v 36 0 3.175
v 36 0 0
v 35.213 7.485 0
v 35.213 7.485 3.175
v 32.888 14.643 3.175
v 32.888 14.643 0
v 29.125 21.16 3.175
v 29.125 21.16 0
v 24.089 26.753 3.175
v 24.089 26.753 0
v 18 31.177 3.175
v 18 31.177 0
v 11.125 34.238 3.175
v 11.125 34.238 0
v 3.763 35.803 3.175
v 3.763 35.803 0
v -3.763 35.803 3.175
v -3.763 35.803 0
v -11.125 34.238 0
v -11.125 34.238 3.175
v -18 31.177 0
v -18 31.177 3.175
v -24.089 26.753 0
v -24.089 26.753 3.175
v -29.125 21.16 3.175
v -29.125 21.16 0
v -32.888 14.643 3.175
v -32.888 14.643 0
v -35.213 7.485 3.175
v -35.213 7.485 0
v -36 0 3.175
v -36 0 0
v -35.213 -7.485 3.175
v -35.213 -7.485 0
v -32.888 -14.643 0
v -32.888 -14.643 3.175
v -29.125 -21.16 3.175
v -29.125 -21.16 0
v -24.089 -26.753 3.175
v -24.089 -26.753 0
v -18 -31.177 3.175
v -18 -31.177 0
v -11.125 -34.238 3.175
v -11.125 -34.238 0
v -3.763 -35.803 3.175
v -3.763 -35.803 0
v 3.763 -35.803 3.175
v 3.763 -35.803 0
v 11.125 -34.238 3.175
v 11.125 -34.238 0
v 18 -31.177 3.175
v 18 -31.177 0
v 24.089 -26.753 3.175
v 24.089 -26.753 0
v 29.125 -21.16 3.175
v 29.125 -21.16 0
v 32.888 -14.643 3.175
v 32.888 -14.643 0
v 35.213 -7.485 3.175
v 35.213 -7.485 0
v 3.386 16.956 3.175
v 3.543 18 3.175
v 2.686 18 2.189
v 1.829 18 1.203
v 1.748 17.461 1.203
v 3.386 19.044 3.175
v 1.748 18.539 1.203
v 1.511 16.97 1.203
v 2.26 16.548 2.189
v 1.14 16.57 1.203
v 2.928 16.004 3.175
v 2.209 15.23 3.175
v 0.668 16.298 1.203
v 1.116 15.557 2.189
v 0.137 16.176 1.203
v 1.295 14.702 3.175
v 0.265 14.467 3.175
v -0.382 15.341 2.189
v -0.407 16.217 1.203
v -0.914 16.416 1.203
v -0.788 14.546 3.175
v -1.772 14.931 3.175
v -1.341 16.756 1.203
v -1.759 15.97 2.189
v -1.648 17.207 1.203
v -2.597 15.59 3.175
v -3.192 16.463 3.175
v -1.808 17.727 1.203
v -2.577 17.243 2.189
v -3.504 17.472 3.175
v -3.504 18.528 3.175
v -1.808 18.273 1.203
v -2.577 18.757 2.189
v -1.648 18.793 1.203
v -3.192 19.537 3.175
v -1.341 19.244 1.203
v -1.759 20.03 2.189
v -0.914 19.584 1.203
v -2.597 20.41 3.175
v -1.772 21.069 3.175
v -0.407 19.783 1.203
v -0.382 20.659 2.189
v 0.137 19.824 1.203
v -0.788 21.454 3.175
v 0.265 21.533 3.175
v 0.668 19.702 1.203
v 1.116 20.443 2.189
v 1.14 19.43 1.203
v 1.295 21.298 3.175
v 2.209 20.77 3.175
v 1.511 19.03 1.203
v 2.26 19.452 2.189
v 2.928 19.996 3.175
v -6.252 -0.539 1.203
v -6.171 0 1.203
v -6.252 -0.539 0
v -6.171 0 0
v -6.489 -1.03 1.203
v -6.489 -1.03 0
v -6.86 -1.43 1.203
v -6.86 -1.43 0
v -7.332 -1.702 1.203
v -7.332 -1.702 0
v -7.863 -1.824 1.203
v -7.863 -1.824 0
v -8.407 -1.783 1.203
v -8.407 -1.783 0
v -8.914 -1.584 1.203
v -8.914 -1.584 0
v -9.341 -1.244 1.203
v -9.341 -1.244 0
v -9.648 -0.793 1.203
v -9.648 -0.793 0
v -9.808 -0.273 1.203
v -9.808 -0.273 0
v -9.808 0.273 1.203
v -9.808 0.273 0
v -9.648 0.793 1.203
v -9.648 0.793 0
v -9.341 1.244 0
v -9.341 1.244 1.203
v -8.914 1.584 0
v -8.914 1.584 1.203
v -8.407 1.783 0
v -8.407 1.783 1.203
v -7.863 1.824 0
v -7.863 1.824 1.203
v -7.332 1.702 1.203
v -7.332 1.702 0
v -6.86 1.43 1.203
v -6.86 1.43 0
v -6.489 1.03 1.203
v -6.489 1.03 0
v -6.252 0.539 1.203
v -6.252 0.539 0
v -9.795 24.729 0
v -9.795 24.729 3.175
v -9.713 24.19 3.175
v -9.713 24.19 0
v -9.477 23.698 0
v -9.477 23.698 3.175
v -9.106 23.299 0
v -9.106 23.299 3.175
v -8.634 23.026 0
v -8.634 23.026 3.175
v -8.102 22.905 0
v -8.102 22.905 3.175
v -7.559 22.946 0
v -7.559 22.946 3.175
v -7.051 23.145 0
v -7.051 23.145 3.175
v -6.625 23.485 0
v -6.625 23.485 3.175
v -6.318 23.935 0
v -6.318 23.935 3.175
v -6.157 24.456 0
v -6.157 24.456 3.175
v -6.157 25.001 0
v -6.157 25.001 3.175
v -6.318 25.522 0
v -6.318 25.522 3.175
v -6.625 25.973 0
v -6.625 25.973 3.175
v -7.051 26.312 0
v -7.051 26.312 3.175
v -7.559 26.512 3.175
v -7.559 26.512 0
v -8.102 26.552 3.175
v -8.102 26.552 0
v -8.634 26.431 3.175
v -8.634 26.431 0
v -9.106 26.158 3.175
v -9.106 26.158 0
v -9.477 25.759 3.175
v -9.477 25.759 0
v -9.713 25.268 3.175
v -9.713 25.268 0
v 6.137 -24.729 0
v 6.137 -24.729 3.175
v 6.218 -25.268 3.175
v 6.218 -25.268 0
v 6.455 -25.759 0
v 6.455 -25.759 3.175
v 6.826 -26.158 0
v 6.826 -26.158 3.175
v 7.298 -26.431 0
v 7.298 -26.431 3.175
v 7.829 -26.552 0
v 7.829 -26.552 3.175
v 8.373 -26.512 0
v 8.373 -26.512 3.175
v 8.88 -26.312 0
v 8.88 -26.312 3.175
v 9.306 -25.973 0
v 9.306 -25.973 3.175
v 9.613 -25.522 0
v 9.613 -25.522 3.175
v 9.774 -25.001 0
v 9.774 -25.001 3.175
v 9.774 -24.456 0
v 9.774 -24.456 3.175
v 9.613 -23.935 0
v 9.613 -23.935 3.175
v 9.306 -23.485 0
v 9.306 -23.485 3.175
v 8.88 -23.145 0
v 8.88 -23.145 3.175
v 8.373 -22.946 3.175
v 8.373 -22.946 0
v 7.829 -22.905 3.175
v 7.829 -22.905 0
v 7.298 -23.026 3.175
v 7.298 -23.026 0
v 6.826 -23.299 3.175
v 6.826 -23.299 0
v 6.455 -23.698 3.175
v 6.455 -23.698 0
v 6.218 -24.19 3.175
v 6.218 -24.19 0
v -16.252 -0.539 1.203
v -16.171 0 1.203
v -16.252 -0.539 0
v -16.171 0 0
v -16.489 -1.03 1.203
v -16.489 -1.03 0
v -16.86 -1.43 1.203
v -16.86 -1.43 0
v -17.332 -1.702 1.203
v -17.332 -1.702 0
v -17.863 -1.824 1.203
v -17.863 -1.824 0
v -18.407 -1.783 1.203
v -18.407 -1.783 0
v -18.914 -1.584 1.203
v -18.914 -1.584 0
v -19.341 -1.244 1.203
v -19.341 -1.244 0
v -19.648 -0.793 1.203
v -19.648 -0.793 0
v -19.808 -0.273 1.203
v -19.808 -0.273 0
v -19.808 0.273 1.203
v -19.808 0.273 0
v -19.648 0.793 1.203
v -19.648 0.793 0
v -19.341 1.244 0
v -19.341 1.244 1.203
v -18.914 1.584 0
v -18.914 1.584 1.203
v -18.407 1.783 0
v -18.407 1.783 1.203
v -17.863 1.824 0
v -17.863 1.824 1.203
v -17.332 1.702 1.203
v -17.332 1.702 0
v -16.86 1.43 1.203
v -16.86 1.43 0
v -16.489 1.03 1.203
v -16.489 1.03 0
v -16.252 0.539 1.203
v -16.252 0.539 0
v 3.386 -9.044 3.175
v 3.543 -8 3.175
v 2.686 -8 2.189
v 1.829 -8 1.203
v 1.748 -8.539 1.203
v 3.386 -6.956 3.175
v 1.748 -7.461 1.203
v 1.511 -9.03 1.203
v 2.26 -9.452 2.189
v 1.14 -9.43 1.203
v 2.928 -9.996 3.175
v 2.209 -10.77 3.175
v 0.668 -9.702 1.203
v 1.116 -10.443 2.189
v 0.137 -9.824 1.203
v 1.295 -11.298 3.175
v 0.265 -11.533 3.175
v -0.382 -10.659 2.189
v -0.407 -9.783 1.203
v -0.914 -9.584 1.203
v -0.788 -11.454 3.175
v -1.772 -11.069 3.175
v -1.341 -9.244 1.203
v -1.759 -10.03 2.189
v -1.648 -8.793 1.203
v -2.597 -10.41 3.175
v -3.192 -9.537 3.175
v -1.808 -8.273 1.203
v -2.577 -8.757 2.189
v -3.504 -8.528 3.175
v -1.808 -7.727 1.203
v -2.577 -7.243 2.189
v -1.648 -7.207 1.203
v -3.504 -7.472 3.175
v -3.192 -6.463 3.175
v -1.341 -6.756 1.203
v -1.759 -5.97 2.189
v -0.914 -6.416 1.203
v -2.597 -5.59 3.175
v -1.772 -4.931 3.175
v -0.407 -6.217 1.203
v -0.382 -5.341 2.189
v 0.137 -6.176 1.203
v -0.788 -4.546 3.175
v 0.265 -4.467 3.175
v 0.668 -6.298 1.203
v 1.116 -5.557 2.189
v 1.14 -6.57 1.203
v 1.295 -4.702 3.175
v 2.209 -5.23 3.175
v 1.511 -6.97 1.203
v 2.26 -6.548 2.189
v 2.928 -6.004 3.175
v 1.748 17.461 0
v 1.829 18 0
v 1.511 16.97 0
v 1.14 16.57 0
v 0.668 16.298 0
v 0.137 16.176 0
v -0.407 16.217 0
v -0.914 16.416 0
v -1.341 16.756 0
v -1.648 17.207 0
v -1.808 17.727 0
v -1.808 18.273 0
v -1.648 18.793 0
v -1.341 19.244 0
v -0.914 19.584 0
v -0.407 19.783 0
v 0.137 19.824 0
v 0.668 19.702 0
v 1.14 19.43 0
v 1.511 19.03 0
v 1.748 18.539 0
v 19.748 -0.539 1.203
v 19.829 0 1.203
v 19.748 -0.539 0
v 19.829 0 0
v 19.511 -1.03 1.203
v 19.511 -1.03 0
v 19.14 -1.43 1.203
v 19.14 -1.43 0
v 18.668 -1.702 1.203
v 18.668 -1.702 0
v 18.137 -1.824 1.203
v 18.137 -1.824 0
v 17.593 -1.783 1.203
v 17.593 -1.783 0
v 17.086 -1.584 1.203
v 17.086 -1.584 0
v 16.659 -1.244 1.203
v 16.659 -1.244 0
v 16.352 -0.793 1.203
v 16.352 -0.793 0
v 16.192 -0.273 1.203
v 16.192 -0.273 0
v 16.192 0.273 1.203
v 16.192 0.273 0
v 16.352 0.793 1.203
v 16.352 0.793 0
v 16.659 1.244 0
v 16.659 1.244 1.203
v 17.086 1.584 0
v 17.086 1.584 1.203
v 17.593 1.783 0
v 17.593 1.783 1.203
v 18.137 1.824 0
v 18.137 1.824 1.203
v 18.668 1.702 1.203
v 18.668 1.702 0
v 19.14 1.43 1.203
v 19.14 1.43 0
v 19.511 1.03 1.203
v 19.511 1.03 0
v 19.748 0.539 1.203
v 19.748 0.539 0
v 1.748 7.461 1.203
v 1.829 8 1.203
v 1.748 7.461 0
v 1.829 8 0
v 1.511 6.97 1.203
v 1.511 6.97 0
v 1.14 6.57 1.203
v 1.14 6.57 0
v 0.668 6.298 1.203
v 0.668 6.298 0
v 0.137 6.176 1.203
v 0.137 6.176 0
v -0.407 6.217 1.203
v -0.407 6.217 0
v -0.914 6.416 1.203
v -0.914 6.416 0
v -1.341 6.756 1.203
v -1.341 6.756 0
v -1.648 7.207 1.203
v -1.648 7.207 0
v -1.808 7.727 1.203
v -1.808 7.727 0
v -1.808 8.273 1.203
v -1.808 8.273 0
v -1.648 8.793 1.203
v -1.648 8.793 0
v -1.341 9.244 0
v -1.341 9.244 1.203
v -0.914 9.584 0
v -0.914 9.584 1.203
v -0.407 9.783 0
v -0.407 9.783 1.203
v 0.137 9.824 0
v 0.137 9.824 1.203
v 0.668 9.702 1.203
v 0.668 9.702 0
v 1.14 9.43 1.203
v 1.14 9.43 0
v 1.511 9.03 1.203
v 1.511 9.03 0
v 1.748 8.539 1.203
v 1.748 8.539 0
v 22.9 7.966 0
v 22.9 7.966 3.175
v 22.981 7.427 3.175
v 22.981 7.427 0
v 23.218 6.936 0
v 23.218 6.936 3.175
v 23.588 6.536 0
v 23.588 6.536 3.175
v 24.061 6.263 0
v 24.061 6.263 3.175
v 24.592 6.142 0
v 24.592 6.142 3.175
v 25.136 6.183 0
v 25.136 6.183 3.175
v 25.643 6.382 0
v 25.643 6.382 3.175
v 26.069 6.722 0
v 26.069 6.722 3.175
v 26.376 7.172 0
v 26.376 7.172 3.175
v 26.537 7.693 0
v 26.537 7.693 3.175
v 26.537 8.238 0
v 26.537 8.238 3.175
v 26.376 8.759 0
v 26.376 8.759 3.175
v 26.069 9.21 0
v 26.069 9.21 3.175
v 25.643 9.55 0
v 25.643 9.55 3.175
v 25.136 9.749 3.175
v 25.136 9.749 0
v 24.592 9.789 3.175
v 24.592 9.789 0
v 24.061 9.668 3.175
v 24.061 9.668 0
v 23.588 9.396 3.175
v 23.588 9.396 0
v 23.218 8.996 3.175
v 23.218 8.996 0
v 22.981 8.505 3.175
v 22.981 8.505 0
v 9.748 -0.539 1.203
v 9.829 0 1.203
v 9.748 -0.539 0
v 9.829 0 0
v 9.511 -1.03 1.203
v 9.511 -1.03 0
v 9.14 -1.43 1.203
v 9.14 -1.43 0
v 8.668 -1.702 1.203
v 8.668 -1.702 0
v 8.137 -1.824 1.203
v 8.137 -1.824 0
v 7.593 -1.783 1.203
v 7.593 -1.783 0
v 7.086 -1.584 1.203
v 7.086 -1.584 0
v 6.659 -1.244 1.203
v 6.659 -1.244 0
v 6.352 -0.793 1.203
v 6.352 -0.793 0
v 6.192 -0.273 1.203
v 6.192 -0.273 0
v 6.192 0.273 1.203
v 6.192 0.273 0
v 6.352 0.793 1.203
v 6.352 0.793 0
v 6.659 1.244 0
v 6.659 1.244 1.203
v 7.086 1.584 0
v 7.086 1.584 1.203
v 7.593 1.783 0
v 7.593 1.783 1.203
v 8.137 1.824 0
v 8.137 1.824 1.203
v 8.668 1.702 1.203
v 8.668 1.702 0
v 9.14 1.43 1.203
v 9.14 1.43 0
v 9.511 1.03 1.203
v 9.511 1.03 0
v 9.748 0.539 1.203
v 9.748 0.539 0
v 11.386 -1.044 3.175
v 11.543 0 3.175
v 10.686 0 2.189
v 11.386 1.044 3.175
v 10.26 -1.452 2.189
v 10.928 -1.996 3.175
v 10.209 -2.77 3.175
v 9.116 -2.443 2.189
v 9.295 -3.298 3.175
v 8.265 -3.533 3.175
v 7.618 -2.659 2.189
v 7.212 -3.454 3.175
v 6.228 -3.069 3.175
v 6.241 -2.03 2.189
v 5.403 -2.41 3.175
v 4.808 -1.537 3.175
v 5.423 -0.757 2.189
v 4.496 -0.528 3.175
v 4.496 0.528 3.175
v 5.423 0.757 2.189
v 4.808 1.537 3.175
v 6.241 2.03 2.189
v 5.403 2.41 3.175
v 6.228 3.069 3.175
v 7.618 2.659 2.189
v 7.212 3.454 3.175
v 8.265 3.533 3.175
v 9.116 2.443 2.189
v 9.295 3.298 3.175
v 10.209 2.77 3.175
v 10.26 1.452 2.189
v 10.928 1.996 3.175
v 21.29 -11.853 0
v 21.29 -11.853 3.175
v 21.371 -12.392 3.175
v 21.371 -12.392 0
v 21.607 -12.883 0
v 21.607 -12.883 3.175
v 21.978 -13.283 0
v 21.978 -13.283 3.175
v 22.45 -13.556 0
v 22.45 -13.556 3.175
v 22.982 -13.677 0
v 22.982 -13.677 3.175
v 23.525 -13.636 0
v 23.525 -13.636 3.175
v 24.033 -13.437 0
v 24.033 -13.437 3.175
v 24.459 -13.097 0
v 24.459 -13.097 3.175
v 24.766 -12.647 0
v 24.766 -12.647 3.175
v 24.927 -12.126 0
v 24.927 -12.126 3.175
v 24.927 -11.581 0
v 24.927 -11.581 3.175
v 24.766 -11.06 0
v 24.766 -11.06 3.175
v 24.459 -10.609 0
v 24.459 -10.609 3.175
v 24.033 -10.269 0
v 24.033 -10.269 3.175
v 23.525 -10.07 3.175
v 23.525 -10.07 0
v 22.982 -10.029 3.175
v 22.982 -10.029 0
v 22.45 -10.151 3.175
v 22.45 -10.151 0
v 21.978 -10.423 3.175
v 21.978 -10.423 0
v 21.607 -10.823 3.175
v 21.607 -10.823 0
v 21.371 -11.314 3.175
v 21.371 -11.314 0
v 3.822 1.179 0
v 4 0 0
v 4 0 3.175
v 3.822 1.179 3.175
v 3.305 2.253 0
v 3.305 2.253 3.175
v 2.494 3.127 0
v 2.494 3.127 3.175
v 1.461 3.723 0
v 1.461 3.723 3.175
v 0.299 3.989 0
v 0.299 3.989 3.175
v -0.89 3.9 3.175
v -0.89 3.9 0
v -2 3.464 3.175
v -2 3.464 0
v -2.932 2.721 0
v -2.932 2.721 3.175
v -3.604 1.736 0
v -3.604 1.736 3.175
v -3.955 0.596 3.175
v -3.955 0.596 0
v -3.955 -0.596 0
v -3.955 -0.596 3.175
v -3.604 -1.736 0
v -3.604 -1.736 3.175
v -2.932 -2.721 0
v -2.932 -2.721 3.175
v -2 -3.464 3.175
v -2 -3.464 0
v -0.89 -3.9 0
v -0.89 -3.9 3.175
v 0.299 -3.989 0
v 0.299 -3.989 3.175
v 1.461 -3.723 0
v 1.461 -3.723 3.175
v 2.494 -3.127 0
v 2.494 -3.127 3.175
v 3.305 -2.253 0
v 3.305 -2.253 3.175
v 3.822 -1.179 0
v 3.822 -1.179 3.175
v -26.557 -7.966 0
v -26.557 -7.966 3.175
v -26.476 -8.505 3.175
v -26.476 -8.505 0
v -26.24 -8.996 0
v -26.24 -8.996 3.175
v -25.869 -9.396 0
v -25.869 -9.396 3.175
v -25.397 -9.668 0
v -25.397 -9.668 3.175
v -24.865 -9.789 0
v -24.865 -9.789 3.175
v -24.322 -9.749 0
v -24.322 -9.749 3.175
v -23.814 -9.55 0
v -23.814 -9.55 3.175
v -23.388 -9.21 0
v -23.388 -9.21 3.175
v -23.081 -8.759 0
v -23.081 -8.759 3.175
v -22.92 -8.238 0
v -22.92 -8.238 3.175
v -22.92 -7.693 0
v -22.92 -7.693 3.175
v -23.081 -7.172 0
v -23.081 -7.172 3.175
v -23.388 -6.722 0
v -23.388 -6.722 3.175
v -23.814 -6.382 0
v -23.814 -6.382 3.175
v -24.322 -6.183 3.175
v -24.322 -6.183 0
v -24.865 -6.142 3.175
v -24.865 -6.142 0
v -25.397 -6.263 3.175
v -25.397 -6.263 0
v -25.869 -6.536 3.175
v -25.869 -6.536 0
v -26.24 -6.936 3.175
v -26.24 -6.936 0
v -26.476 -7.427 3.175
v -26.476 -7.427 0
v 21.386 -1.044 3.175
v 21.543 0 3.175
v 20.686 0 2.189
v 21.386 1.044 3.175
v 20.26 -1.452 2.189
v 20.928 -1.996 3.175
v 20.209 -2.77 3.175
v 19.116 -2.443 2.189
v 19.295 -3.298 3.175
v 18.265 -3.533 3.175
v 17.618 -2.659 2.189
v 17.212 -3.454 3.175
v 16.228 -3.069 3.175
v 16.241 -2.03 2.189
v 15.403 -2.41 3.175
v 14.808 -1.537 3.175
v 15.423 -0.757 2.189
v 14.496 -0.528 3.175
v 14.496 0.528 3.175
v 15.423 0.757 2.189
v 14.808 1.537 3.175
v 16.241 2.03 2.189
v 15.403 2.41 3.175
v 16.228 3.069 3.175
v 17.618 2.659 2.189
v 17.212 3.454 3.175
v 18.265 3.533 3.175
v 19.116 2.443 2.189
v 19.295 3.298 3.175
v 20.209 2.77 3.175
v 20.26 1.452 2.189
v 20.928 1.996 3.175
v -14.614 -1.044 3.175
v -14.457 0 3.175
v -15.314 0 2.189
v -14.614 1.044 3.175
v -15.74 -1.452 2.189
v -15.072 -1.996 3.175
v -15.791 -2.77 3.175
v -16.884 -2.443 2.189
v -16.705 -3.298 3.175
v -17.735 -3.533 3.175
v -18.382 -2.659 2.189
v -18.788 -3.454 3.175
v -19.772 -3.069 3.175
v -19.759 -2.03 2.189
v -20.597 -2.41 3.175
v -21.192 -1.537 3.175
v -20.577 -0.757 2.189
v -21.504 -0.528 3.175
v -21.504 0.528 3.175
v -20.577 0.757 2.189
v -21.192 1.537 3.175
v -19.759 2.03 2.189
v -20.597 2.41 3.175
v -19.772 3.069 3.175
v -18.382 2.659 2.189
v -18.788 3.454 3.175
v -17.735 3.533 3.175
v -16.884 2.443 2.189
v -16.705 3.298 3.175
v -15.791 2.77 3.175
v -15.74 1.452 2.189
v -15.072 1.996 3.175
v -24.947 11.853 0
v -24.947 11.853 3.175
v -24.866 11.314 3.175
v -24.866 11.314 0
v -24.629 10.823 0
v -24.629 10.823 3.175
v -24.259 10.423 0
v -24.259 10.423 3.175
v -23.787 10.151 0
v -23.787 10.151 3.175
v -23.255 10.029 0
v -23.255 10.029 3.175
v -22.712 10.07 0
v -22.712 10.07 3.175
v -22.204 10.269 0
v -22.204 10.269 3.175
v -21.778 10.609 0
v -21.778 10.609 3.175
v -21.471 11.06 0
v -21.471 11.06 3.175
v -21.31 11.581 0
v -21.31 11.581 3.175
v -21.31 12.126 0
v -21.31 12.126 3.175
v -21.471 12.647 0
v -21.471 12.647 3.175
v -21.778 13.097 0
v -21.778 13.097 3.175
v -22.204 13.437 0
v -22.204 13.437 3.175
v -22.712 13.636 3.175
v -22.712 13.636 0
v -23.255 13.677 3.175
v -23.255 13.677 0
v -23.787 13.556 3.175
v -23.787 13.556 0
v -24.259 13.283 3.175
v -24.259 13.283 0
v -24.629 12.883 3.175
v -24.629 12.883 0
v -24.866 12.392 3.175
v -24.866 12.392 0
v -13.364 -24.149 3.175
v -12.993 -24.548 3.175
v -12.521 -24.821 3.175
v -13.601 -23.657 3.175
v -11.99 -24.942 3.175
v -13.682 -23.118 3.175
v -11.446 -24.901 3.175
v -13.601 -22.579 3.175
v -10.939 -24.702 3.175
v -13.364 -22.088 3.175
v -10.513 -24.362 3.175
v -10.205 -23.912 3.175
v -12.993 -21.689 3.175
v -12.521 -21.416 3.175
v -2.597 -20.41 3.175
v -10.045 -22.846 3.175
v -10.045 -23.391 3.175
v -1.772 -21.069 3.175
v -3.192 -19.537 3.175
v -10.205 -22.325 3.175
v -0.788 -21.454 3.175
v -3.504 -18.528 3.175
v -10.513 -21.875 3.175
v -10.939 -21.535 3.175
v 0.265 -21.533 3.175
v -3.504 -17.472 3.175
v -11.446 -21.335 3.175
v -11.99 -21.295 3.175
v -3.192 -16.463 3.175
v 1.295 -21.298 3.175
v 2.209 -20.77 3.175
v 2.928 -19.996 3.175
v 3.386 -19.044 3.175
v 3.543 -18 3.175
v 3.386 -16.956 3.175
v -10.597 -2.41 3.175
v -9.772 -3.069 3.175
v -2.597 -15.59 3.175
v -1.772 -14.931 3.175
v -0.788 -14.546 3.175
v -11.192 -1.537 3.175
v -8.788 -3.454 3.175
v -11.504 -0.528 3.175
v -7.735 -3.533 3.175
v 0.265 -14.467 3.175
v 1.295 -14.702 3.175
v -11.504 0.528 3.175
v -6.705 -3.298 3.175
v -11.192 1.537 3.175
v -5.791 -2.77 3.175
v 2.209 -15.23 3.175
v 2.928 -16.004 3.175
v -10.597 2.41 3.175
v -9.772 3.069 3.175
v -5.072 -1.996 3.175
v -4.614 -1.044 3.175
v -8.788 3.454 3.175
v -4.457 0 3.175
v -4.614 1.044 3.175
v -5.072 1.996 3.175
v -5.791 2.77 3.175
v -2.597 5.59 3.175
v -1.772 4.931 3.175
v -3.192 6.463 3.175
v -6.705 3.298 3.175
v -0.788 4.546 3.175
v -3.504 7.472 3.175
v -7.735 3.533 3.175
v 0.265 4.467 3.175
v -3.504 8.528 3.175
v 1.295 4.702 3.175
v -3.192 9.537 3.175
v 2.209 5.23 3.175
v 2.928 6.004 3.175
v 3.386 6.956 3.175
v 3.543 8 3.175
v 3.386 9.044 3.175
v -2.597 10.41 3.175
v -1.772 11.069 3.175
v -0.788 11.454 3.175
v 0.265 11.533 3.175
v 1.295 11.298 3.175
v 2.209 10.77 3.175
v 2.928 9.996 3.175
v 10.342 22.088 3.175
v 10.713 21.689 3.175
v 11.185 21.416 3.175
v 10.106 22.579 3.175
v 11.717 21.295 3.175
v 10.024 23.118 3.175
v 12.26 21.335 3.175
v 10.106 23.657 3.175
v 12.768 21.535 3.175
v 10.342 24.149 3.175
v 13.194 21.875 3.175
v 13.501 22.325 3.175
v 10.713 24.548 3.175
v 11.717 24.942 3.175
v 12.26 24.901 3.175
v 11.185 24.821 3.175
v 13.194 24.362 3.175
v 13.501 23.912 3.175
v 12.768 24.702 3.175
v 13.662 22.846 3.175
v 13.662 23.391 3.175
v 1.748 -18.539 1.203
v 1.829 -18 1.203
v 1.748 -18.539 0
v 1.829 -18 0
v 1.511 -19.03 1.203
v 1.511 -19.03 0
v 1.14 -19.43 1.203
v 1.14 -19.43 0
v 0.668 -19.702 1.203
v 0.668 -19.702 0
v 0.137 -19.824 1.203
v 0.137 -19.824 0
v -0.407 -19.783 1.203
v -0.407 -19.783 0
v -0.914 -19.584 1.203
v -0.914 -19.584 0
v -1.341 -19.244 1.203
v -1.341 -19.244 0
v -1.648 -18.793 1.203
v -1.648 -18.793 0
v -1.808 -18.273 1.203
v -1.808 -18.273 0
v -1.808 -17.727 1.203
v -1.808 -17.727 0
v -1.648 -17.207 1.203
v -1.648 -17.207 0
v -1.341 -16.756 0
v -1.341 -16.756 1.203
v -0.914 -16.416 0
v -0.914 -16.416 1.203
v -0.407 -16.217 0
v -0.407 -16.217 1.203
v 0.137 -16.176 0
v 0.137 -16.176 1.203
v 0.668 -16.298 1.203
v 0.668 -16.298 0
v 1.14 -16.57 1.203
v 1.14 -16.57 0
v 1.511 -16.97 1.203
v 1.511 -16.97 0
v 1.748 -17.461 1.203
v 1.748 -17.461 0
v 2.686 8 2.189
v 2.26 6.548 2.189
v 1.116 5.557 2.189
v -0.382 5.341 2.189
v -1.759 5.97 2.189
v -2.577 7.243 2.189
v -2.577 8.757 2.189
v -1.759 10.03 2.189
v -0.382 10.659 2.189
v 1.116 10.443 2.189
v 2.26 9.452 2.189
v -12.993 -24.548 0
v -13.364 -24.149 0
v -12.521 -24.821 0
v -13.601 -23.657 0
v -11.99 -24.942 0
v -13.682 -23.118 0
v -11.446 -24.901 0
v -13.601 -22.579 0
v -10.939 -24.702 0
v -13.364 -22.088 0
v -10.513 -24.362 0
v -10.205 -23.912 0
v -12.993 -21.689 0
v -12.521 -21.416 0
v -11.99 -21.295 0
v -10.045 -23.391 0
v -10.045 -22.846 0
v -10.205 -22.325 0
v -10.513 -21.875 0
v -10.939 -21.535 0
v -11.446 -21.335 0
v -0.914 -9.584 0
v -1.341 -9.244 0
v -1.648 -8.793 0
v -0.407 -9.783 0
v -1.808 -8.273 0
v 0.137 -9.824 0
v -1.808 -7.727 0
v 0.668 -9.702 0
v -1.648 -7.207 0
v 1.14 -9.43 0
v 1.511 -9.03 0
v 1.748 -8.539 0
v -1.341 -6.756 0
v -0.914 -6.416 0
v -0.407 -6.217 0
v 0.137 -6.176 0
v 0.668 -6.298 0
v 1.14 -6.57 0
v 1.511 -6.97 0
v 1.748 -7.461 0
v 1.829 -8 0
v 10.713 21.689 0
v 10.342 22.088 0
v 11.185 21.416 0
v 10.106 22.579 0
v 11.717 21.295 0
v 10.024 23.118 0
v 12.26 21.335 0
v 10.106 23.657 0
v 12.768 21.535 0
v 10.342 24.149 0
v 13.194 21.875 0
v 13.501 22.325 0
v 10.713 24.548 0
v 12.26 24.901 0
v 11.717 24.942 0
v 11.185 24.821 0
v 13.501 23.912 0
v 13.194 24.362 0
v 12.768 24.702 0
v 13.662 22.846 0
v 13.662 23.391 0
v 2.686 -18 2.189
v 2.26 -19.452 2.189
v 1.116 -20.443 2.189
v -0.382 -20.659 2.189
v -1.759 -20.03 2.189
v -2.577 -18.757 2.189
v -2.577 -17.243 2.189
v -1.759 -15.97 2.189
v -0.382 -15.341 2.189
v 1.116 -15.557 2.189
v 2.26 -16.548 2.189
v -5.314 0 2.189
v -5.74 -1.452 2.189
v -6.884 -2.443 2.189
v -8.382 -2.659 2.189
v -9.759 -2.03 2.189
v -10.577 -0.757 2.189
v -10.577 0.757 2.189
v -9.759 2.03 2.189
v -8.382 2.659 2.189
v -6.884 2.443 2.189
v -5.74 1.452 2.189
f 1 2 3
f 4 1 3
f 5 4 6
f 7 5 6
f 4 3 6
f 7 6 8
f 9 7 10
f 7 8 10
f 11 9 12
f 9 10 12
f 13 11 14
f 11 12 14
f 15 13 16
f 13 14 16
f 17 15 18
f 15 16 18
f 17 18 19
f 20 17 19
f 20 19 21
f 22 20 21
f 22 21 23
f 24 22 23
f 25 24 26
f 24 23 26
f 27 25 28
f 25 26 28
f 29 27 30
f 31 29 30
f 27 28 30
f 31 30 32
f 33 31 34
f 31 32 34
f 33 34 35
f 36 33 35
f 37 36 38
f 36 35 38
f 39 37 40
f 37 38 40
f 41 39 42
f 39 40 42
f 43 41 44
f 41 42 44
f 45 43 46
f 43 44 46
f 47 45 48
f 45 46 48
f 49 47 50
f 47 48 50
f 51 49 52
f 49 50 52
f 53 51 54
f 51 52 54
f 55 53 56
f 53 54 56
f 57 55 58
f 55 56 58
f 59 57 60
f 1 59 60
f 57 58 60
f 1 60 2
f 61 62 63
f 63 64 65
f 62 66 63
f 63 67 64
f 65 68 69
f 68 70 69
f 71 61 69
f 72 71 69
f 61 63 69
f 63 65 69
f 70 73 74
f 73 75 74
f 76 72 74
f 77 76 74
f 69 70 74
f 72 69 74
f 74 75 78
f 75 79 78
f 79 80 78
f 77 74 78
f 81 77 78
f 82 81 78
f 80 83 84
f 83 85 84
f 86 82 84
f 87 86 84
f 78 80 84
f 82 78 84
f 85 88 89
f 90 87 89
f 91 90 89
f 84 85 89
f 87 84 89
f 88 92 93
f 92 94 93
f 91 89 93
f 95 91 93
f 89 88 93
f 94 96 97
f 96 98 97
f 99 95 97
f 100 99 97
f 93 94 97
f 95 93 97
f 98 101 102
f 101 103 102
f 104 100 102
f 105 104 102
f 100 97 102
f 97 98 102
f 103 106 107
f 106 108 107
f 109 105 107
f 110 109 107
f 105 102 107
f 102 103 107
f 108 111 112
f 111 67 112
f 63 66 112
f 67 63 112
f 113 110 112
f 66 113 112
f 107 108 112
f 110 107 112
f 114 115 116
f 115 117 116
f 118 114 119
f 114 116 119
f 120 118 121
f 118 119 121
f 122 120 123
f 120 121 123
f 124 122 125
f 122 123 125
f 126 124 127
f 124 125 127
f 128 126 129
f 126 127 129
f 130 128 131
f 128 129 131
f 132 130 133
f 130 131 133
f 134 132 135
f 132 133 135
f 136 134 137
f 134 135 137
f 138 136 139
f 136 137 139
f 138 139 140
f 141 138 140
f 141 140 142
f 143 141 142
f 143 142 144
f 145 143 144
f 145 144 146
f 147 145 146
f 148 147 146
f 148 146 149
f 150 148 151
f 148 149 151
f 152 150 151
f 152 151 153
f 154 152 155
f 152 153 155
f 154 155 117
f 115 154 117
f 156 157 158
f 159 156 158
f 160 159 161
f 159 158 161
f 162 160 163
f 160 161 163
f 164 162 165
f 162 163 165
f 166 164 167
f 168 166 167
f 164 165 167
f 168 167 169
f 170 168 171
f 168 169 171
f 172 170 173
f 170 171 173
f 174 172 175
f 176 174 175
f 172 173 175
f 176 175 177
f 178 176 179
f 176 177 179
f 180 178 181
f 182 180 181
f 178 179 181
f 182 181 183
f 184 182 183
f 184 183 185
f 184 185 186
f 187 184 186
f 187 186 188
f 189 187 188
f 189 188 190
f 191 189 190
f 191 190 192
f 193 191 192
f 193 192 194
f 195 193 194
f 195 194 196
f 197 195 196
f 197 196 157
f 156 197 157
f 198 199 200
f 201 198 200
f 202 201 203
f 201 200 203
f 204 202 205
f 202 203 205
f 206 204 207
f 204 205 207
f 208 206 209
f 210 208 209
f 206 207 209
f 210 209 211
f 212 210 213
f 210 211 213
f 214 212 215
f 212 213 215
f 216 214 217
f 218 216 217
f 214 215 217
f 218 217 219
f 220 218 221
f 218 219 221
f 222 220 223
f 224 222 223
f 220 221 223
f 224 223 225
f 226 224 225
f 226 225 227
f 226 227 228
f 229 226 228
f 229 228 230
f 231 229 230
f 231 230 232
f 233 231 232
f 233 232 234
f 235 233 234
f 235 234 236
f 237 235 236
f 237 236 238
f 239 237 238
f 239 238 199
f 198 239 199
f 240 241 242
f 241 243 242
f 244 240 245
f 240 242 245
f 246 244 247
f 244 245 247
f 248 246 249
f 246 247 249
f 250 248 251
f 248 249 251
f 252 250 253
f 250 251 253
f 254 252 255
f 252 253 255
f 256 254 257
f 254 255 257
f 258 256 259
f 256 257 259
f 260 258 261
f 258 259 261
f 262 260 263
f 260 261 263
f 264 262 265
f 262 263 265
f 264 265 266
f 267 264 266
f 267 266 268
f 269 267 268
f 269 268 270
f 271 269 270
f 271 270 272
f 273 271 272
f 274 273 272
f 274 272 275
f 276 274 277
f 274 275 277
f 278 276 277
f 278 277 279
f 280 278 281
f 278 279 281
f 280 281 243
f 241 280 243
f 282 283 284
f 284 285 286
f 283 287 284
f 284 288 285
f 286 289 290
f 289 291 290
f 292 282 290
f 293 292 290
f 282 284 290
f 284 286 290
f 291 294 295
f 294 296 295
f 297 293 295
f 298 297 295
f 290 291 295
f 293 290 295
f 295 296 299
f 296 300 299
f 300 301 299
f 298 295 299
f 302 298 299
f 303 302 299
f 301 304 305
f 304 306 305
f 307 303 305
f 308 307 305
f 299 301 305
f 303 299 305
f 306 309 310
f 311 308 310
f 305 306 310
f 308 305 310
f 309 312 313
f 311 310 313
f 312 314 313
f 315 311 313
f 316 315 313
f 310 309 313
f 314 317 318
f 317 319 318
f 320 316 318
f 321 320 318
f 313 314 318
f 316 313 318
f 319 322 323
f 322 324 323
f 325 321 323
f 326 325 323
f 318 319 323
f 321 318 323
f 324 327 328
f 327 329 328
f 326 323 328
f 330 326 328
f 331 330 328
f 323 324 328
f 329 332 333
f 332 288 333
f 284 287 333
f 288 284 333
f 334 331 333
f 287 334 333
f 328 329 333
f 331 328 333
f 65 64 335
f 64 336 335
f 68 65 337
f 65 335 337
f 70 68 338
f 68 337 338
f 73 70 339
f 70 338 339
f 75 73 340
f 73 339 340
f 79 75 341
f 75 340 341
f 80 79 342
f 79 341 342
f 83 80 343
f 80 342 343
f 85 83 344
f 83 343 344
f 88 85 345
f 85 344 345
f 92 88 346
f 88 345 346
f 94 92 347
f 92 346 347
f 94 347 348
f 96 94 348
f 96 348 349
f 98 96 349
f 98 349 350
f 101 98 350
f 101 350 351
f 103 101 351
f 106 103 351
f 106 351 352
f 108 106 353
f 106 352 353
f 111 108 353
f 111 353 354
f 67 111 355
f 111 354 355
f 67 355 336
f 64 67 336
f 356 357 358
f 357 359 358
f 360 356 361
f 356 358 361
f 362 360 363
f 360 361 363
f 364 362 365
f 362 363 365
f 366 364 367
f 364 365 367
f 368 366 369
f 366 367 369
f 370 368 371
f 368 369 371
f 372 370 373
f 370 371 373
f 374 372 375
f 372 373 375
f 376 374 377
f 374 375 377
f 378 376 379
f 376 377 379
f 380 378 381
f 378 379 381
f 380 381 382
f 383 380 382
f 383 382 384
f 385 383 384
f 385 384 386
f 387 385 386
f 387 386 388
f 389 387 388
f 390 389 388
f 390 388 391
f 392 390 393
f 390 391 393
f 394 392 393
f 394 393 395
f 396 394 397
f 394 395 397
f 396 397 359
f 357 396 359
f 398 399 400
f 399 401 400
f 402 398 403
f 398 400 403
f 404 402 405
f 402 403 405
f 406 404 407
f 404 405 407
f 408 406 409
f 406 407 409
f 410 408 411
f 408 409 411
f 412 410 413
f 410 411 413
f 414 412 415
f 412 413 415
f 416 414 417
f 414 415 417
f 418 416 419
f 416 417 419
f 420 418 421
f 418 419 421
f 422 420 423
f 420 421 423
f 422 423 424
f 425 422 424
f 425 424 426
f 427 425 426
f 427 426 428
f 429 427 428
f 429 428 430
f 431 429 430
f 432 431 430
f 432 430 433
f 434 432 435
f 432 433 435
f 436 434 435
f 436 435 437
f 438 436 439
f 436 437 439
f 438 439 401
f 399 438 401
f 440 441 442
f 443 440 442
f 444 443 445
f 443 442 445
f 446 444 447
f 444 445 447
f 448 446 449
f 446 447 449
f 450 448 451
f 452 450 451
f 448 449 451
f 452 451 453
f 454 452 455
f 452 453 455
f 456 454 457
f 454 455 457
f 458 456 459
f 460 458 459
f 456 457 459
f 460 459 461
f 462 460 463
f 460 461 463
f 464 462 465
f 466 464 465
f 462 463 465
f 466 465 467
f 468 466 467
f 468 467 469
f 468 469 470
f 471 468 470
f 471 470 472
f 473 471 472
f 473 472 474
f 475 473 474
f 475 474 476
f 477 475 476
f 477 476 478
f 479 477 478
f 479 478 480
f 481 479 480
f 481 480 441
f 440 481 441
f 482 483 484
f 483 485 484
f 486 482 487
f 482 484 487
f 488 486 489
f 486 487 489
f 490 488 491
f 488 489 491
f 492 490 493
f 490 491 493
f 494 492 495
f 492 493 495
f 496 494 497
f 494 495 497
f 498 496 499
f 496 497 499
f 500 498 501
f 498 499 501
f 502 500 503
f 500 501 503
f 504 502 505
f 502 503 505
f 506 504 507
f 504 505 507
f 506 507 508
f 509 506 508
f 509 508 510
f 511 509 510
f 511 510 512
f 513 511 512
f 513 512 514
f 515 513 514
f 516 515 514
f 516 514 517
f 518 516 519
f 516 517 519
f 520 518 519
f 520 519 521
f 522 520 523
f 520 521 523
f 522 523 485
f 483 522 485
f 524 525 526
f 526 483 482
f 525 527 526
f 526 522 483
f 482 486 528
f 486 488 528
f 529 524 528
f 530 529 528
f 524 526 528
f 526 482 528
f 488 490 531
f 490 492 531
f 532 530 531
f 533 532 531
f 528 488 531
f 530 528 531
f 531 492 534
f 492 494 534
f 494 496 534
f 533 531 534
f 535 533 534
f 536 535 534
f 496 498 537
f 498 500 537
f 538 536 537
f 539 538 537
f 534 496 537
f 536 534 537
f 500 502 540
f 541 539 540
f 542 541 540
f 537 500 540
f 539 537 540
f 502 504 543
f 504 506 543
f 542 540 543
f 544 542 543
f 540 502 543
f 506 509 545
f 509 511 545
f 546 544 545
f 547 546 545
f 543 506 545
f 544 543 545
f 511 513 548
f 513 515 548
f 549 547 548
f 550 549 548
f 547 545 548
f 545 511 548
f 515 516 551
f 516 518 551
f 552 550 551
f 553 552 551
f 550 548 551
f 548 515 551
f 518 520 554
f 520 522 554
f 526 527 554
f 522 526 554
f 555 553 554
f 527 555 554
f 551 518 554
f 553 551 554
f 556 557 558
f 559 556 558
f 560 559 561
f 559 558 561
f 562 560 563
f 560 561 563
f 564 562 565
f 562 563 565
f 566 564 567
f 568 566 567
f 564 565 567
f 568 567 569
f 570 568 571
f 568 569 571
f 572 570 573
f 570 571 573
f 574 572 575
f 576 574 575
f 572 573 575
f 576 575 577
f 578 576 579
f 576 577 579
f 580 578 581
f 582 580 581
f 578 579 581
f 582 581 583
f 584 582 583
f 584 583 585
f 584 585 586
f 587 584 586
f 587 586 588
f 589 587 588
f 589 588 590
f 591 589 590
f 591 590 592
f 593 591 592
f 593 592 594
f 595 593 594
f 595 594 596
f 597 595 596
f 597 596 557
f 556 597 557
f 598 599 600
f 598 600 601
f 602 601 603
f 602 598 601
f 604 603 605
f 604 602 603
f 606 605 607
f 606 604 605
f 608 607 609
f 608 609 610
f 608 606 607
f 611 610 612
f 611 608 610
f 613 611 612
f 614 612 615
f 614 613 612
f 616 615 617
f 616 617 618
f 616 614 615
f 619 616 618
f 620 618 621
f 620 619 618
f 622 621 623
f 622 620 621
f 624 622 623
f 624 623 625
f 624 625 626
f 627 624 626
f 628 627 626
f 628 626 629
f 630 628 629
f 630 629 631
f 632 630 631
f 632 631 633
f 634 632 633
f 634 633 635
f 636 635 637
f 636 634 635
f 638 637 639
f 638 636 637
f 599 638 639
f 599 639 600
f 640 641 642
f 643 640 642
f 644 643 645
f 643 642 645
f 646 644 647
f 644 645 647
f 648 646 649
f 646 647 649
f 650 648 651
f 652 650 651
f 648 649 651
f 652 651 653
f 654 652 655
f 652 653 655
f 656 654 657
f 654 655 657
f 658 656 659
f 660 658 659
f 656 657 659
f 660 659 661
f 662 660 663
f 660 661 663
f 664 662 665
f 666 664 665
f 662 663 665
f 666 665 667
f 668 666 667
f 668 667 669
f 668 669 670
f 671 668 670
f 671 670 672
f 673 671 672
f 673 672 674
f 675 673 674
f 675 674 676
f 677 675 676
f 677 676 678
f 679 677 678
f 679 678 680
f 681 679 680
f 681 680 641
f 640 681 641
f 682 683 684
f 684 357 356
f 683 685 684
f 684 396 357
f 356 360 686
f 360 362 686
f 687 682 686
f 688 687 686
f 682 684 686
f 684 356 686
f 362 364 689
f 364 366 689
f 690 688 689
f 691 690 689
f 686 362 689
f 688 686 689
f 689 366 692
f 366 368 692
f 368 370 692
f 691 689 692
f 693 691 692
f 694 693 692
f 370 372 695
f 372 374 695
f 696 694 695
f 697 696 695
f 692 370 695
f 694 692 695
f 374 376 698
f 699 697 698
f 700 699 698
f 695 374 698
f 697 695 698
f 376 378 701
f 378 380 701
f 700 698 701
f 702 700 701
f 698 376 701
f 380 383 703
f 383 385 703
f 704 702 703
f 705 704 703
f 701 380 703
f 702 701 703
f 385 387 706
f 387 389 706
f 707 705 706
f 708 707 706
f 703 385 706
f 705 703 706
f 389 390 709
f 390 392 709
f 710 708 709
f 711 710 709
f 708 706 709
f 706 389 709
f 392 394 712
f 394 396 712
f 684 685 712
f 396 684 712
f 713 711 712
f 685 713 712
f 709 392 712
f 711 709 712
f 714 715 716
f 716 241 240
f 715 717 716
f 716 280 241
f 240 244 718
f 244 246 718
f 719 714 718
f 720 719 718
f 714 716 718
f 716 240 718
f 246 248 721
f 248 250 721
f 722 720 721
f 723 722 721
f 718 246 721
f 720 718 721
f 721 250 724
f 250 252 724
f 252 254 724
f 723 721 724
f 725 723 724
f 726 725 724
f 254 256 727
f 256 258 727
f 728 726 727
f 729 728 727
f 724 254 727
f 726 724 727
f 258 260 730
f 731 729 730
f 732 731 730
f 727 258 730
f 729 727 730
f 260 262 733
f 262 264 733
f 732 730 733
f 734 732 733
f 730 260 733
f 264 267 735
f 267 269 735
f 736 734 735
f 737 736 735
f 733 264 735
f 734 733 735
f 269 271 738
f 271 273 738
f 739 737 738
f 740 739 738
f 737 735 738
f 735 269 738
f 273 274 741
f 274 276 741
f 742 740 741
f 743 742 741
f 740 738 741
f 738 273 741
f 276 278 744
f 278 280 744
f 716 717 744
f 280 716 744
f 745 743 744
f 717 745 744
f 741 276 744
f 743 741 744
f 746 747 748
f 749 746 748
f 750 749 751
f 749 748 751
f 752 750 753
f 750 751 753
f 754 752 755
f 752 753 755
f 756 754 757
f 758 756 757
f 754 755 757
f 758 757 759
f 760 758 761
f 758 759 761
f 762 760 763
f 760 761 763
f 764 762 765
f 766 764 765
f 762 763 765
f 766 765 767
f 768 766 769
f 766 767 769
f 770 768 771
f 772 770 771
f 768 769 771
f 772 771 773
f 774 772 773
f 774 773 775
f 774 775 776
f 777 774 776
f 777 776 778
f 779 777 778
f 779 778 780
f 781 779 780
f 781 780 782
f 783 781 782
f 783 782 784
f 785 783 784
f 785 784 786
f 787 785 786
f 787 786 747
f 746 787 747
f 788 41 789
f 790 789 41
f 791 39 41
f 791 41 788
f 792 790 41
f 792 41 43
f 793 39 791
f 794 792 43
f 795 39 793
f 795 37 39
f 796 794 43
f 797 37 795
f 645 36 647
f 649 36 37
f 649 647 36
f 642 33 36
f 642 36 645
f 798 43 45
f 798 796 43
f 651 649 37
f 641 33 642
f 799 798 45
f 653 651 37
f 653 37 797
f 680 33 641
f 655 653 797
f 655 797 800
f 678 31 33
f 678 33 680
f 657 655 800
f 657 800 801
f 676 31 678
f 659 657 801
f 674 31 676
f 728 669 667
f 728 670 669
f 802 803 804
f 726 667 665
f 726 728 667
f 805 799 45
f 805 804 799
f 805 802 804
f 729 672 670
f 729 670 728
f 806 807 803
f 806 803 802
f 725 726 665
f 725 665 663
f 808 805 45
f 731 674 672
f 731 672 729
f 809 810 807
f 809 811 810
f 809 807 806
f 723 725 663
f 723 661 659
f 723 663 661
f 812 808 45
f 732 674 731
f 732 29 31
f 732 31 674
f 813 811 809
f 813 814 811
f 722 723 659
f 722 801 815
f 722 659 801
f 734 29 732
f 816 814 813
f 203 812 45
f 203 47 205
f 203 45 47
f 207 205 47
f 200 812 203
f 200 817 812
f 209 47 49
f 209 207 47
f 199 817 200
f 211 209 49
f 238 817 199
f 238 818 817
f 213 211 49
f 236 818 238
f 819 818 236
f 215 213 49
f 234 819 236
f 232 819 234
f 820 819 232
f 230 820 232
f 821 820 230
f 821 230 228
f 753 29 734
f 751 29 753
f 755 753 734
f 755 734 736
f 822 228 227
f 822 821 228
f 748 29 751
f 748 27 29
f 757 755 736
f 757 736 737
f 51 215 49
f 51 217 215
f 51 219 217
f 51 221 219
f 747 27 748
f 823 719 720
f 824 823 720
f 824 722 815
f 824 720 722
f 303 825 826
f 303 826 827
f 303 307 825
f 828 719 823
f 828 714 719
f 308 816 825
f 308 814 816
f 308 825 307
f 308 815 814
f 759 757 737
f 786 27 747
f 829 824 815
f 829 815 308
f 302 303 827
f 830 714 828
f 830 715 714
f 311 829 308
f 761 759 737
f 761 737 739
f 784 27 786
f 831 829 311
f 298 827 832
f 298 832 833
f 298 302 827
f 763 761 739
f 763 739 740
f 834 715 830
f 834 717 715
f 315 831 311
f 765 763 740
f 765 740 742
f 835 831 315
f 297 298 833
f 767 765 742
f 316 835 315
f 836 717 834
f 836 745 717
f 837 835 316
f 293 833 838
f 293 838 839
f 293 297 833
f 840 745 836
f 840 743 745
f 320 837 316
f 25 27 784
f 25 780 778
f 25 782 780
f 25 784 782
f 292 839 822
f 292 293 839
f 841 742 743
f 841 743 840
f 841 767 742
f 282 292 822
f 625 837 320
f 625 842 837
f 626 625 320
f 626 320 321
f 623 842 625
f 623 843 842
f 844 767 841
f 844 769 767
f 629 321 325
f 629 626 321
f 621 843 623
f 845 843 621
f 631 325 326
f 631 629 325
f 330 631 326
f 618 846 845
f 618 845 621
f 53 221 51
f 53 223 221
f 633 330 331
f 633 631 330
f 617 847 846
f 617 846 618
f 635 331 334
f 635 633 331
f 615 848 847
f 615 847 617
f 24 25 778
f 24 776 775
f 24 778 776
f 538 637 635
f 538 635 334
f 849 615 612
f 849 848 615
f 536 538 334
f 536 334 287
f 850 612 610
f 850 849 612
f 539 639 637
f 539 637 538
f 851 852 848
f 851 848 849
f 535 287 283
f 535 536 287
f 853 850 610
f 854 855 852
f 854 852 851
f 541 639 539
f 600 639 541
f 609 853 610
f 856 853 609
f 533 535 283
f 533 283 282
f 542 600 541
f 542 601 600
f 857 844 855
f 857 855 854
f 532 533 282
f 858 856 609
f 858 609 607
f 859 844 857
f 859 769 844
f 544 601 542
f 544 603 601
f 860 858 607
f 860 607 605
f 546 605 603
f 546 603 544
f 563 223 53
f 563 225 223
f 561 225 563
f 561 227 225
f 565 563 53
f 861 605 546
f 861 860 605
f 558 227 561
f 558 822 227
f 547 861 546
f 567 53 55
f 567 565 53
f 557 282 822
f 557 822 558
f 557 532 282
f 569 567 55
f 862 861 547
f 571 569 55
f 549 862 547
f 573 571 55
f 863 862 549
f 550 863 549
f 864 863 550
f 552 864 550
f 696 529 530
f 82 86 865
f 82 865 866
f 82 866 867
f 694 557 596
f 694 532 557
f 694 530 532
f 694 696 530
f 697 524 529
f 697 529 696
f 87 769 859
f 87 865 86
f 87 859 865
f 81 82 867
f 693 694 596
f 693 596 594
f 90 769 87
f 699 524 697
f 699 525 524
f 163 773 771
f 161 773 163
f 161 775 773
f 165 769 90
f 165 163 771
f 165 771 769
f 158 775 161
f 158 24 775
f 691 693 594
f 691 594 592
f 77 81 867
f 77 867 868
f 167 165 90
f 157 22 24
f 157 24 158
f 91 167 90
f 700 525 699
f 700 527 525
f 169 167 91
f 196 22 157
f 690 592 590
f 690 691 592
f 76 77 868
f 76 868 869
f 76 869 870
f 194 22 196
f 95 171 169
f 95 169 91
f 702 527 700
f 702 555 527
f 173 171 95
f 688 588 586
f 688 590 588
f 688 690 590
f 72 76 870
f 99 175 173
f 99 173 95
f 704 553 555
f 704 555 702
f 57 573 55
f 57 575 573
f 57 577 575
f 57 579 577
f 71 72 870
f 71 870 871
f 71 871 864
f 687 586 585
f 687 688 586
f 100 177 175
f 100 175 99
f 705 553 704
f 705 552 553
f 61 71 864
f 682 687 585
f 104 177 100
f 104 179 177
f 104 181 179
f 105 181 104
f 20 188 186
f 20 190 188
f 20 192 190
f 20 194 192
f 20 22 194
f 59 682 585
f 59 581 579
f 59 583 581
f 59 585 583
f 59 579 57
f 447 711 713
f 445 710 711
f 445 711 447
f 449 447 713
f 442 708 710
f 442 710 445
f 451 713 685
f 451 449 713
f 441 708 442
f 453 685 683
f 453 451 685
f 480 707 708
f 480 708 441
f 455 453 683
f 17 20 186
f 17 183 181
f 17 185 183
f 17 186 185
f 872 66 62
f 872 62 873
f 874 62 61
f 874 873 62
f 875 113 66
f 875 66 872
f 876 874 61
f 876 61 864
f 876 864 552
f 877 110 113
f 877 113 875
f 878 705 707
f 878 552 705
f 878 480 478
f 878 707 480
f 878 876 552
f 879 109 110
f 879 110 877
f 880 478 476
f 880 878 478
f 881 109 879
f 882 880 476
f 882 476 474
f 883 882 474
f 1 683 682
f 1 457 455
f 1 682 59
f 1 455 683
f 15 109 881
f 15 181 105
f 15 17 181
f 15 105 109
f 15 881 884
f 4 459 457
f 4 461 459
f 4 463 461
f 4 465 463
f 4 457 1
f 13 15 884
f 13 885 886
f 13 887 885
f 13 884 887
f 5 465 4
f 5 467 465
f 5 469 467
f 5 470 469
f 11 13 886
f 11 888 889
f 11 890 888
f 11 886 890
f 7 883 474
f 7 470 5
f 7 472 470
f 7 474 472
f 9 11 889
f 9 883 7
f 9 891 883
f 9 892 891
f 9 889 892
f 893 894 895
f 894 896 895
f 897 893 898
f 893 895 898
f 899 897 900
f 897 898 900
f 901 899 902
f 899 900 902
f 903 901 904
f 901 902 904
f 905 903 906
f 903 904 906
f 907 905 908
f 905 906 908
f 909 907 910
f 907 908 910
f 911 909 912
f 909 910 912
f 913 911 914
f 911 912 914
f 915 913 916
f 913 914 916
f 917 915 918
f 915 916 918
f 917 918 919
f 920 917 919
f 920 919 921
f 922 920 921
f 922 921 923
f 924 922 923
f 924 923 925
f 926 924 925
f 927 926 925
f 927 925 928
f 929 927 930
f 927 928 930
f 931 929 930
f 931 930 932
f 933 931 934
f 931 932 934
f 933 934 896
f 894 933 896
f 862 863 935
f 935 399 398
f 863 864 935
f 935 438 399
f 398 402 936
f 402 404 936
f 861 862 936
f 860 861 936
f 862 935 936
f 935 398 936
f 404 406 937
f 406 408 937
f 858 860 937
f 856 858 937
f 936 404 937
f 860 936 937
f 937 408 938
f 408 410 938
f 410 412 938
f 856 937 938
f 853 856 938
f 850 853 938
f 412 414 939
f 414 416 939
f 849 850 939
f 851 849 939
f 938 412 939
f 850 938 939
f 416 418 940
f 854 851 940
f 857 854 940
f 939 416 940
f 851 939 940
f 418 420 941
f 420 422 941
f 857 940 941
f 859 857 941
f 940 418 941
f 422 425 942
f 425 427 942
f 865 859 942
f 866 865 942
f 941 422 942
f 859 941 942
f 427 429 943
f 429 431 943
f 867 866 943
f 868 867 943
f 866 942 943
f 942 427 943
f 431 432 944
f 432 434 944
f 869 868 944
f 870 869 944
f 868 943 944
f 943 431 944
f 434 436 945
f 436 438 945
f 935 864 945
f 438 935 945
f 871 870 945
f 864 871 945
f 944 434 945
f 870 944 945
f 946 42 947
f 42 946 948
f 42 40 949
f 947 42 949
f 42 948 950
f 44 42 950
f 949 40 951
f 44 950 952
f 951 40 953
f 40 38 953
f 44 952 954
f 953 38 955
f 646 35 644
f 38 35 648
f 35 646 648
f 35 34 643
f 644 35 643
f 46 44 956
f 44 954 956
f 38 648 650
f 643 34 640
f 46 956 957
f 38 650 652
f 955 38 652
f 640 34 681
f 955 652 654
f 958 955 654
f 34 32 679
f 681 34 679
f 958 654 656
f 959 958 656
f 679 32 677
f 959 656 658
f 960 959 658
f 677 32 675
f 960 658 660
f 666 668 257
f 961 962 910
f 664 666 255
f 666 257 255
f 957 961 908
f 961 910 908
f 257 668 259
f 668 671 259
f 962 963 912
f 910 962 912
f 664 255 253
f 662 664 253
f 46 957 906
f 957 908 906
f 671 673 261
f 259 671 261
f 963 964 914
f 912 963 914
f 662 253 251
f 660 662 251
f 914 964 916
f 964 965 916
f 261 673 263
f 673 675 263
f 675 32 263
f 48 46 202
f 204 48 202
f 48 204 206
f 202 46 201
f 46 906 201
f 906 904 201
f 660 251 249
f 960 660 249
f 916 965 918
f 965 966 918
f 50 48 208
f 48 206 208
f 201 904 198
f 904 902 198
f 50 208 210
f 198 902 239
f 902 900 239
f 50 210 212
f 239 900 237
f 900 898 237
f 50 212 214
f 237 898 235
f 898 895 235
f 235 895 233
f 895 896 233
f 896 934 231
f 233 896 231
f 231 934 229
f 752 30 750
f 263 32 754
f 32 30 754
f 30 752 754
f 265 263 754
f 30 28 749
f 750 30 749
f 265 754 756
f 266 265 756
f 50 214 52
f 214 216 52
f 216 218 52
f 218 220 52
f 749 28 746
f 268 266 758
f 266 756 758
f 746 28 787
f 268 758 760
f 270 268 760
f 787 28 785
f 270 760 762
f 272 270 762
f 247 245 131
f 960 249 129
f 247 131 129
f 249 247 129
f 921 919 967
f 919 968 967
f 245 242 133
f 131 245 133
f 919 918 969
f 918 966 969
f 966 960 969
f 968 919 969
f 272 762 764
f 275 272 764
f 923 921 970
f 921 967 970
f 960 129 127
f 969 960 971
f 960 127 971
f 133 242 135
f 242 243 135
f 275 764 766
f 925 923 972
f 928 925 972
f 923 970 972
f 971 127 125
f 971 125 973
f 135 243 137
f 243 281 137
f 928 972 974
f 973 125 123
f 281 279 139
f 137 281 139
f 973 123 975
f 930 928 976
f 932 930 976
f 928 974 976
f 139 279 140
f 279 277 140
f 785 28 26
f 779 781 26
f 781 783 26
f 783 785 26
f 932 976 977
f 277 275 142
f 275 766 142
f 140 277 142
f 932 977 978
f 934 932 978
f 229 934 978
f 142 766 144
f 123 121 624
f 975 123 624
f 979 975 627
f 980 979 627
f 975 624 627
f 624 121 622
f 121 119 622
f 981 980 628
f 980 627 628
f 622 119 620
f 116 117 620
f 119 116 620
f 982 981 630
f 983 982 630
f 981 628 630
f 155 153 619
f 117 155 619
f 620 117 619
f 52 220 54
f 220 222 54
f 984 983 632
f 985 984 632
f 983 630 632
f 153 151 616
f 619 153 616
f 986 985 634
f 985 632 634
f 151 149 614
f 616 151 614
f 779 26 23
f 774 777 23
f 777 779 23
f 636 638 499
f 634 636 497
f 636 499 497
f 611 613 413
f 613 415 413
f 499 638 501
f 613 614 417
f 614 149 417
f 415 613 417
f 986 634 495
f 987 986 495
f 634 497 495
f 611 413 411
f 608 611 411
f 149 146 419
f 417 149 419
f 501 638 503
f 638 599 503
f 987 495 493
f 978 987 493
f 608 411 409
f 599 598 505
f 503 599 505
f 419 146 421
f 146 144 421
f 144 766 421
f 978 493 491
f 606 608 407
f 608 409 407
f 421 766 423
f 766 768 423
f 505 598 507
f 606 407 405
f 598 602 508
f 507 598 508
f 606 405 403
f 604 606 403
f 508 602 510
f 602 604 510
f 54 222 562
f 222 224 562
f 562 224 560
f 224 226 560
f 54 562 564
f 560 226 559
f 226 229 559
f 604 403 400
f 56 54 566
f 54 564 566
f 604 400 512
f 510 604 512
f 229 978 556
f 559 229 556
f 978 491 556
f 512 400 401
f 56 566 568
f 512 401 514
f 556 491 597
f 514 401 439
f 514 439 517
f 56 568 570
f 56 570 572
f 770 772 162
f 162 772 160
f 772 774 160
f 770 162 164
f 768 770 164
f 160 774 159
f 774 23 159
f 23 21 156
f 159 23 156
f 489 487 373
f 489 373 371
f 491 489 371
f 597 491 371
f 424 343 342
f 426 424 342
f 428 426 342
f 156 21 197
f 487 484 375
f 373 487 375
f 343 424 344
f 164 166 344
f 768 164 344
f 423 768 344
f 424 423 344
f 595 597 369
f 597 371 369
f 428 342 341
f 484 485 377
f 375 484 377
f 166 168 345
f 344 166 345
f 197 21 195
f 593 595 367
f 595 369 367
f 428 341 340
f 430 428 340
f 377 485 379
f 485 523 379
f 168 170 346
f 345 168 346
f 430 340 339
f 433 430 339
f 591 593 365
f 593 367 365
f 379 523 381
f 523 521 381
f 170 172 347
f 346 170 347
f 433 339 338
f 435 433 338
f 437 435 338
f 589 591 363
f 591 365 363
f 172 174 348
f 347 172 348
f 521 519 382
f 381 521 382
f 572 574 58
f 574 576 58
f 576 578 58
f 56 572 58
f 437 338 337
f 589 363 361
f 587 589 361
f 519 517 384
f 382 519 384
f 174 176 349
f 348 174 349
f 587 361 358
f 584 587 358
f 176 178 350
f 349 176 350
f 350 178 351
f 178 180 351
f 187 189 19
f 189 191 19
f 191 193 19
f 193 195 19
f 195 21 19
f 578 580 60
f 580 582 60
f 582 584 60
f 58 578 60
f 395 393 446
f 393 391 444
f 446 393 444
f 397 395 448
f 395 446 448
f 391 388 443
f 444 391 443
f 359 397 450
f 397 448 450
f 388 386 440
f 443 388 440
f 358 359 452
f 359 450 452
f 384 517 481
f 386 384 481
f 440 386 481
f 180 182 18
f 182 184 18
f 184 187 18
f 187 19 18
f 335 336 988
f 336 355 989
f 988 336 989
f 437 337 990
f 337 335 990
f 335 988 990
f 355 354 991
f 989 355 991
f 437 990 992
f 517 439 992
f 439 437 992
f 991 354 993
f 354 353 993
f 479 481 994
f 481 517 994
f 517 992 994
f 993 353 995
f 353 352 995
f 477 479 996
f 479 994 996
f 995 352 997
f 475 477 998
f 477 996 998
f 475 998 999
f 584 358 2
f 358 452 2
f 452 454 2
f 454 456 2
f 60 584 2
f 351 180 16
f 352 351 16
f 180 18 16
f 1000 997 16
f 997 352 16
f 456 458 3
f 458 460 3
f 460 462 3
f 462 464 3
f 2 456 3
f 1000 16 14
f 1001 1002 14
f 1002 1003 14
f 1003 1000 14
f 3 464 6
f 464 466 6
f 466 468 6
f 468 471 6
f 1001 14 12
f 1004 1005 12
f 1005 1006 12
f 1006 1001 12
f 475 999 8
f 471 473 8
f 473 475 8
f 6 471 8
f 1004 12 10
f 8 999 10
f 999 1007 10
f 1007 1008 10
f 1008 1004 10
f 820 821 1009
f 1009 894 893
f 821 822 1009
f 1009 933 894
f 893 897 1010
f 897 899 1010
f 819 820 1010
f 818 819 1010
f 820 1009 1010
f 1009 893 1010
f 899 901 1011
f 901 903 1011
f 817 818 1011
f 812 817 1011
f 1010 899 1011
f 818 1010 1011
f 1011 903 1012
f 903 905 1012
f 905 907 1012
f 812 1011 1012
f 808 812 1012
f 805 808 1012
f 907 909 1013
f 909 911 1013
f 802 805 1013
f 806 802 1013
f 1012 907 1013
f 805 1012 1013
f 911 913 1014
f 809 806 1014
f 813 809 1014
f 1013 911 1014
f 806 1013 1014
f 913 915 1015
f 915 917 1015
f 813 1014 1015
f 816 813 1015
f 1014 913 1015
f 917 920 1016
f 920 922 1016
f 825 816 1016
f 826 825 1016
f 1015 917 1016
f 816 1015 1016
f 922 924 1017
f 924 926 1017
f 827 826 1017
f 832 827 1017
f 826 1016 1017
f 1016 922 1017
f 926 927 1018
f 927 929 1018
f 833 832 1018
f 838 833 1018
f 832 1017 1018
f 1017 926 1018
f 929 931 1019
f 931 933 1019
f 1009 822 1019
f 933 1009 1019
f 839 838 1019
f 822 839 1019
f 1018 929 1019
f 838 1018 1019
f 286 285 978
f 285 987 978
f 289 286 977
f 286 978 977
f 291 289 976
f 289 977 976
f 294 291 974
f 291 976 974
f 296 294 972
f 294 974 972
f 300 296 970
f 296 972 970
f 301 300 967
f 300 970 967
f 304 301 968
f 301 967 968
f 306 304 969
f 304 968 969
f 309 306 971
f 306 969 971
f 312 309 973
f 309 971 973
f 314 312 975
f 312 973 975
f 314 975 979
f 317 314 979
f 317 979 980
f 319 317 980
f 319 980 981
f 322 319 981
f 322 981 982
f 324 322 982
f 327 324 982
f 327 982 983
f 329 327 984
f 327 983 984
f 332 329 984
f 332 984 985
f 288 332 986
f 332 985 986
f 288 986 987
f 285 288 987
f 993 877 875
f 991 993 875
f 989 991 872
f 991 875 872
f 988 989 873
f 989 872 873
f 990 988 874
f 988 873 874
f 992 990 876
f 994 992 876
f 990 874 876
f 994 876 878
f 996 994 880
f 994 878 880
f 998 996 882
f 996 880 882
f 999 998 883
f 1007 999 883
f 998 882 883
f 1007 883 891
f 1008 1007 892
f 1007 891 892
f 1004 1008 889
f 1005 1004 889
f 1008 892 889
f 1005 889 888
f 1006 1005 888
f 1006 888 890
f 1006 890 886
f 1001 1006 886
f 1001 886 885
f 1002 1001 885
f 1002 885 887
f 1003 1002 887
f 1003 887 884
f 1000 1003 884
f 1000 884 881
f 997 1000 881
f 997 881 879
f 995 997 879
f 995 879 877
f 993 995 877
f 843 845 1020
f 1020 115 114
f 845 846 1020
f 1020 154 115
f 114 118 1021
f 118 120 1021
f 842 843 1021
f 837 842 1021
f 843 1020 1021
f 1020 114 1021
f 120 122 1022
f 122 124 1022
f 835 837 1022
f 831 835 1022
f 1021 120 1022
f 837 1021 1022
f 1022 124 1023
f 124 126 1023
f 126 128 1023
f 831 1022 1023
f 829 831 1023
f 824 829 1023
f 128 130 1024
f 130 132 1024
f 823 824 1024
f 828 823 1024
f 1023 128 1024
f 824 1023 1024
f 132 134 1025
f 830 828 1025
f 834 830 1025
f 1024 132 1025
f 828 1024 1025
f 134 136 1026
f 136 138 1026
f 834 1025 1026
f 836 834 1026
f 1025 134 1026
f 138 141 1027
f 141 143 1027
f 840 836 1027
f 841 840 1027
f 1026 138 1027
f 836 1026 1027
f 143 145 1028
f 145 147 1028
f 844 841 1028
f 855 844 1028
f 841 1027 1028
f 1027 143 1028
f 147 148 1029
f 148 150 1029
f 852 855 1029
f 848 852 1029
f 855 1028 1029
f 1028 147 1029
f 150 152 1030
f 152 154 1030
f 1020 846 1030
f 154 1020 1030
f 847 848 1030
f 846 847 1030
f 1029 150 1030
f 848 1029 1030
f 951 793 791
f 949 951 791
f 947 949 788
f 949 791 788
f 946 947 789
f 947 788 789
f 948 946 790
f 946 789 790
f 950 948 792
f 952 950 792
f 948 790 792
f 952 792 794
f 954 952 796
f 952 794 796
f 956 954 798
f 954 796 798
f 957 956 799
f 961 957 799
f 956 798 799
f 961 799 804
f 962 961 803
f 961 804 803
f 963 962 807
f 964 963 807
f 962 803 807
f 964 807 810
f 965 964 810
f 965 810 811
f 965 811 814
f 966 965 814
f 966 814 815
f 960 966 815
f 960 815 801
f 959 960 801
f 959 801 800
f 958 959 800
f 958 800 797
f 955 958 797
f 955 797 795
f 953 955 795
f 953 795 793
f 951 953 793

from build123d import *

# Parameters (mm, degrees)
SKETCH1_R                                      = 4
BOSS_EXTRUDE1_DEPTH                            = 3.175
F_6_CLEARANCE_HOLE1_D                          = 3.6576
F_6_CLEARANCE_HOLE1_DEPTH                      = 8
F_6_CLEARANCE_HOLE1_TIP                        = 1.0988539
CSK_FOR_6_FLAT_HEAD_MACHINE_SCREW2_D           = 3.6576
CSK_FOR_6_FLAT_HEAD_MACHINE_SCREW2_DEPTH       = 8
CSK_FOR_6_FLAT_HEAD_MACHINE_SCREW2_CSINK_D     = 7.0866
CSK_FOR_6_FLAT_HEAD_MACHINE_SCREW2_CSINK_ANGLE = 82
CSK_FOR_6_FLAT_HEAD_MACHINE_SCREW2_TIP         = 1.0988539


with BuildPart() as part:
    # Sketch1 → Boss-Extrude1 (new body)
    with BuildSketch(Plane.XY):
        with BuildLine():
            ThreePointArc((-36, 0), (0, -36), (36, 0))
            ThreePointArc((36, 0), (0, 36), (-36, 0))
        make_face()
        Circle(SKETCH1_R, mode=Mode.SUBTRACT)
    extrude(amount=BOSS_EXTRUDE1_DEPTH)

    # #6 Clearance Hole1
    with Locations(Plane(origin=(0, 0, 0), x_dir=(1, 0, 0), z_dir=(0, 0, -1))):
        with Locations((-11.853175458, 23.118447862), (24.728671999, -7.965750509), (11.853175458, -23.118447862), (-7.965750509, -24.728671999), (-23.118447862, -11.853175458), (-24.728671999, 7.965750509), (7.965750509, 24.728671999), (23.118447862, 11.853175458)):
            Hole(F_6_CLEARANCE_HOLE1_D / 2, depth=F_6_CLEARANCE_HOLE1_DEPTH)
            with Locations((0, 0, -(F_6_CLEARANCE_HOLE1_DEPTH + F_6_CLEARANCE_HOLE1_TIP / 2))):  # 118° drill point
                Cone(0, F_6_CLEARANCE_HOLE1_D / 2, F_6_CLEARANCE_HOLE1_TIP, mode=Mode.SUBTRACT)

    # CSK for #6 Flat Head Machine Screw2
    with Locations(Plane(origin=(0, 0, 3.175), x_dir=(-1, 0, 0), z_dir=(0, 0, 1))):
        with Locations((0, -18), (-18, 0), (0, 18), (18, 0), (0, -8), (-8, 0), (0, 8), (8, 0)):
            CounterSinkHole(CSK_FOR_6_FLAT_HEAD_MACHINE_SCREW2_D / 2, CSK_FOR_6_FLAT_HEAD_MACHINE_SCREW2_CSINK_D / 2, depth=CSK_FOR_6_FLAT_HEAD_MACHINE_SCREW2_DEPTH, counter_sink_angle=CSK_FOR_6_FLAT_HEAD_MACHINE_SCREW2_CSINK_ANGLE)
            with Locations((0, 0, -(CSK_FOR_6_FLAT_HEAD_MACHINE_SCREW2_DEPTH + CSK_FOR_6_FLAT_HEAD_MACHINE_SCREW2_TIP / 2))):  # 118° drill point
                Cone(0, CSK_FOR_6_FLAT_HEAD_MACHINE_SCREW2_D / 2, CSK_FOR_6_FLAT_HEAD_MACHINE_SCREW2_TIP, mode=Mode.SUBTRACT)


solid = part.part
